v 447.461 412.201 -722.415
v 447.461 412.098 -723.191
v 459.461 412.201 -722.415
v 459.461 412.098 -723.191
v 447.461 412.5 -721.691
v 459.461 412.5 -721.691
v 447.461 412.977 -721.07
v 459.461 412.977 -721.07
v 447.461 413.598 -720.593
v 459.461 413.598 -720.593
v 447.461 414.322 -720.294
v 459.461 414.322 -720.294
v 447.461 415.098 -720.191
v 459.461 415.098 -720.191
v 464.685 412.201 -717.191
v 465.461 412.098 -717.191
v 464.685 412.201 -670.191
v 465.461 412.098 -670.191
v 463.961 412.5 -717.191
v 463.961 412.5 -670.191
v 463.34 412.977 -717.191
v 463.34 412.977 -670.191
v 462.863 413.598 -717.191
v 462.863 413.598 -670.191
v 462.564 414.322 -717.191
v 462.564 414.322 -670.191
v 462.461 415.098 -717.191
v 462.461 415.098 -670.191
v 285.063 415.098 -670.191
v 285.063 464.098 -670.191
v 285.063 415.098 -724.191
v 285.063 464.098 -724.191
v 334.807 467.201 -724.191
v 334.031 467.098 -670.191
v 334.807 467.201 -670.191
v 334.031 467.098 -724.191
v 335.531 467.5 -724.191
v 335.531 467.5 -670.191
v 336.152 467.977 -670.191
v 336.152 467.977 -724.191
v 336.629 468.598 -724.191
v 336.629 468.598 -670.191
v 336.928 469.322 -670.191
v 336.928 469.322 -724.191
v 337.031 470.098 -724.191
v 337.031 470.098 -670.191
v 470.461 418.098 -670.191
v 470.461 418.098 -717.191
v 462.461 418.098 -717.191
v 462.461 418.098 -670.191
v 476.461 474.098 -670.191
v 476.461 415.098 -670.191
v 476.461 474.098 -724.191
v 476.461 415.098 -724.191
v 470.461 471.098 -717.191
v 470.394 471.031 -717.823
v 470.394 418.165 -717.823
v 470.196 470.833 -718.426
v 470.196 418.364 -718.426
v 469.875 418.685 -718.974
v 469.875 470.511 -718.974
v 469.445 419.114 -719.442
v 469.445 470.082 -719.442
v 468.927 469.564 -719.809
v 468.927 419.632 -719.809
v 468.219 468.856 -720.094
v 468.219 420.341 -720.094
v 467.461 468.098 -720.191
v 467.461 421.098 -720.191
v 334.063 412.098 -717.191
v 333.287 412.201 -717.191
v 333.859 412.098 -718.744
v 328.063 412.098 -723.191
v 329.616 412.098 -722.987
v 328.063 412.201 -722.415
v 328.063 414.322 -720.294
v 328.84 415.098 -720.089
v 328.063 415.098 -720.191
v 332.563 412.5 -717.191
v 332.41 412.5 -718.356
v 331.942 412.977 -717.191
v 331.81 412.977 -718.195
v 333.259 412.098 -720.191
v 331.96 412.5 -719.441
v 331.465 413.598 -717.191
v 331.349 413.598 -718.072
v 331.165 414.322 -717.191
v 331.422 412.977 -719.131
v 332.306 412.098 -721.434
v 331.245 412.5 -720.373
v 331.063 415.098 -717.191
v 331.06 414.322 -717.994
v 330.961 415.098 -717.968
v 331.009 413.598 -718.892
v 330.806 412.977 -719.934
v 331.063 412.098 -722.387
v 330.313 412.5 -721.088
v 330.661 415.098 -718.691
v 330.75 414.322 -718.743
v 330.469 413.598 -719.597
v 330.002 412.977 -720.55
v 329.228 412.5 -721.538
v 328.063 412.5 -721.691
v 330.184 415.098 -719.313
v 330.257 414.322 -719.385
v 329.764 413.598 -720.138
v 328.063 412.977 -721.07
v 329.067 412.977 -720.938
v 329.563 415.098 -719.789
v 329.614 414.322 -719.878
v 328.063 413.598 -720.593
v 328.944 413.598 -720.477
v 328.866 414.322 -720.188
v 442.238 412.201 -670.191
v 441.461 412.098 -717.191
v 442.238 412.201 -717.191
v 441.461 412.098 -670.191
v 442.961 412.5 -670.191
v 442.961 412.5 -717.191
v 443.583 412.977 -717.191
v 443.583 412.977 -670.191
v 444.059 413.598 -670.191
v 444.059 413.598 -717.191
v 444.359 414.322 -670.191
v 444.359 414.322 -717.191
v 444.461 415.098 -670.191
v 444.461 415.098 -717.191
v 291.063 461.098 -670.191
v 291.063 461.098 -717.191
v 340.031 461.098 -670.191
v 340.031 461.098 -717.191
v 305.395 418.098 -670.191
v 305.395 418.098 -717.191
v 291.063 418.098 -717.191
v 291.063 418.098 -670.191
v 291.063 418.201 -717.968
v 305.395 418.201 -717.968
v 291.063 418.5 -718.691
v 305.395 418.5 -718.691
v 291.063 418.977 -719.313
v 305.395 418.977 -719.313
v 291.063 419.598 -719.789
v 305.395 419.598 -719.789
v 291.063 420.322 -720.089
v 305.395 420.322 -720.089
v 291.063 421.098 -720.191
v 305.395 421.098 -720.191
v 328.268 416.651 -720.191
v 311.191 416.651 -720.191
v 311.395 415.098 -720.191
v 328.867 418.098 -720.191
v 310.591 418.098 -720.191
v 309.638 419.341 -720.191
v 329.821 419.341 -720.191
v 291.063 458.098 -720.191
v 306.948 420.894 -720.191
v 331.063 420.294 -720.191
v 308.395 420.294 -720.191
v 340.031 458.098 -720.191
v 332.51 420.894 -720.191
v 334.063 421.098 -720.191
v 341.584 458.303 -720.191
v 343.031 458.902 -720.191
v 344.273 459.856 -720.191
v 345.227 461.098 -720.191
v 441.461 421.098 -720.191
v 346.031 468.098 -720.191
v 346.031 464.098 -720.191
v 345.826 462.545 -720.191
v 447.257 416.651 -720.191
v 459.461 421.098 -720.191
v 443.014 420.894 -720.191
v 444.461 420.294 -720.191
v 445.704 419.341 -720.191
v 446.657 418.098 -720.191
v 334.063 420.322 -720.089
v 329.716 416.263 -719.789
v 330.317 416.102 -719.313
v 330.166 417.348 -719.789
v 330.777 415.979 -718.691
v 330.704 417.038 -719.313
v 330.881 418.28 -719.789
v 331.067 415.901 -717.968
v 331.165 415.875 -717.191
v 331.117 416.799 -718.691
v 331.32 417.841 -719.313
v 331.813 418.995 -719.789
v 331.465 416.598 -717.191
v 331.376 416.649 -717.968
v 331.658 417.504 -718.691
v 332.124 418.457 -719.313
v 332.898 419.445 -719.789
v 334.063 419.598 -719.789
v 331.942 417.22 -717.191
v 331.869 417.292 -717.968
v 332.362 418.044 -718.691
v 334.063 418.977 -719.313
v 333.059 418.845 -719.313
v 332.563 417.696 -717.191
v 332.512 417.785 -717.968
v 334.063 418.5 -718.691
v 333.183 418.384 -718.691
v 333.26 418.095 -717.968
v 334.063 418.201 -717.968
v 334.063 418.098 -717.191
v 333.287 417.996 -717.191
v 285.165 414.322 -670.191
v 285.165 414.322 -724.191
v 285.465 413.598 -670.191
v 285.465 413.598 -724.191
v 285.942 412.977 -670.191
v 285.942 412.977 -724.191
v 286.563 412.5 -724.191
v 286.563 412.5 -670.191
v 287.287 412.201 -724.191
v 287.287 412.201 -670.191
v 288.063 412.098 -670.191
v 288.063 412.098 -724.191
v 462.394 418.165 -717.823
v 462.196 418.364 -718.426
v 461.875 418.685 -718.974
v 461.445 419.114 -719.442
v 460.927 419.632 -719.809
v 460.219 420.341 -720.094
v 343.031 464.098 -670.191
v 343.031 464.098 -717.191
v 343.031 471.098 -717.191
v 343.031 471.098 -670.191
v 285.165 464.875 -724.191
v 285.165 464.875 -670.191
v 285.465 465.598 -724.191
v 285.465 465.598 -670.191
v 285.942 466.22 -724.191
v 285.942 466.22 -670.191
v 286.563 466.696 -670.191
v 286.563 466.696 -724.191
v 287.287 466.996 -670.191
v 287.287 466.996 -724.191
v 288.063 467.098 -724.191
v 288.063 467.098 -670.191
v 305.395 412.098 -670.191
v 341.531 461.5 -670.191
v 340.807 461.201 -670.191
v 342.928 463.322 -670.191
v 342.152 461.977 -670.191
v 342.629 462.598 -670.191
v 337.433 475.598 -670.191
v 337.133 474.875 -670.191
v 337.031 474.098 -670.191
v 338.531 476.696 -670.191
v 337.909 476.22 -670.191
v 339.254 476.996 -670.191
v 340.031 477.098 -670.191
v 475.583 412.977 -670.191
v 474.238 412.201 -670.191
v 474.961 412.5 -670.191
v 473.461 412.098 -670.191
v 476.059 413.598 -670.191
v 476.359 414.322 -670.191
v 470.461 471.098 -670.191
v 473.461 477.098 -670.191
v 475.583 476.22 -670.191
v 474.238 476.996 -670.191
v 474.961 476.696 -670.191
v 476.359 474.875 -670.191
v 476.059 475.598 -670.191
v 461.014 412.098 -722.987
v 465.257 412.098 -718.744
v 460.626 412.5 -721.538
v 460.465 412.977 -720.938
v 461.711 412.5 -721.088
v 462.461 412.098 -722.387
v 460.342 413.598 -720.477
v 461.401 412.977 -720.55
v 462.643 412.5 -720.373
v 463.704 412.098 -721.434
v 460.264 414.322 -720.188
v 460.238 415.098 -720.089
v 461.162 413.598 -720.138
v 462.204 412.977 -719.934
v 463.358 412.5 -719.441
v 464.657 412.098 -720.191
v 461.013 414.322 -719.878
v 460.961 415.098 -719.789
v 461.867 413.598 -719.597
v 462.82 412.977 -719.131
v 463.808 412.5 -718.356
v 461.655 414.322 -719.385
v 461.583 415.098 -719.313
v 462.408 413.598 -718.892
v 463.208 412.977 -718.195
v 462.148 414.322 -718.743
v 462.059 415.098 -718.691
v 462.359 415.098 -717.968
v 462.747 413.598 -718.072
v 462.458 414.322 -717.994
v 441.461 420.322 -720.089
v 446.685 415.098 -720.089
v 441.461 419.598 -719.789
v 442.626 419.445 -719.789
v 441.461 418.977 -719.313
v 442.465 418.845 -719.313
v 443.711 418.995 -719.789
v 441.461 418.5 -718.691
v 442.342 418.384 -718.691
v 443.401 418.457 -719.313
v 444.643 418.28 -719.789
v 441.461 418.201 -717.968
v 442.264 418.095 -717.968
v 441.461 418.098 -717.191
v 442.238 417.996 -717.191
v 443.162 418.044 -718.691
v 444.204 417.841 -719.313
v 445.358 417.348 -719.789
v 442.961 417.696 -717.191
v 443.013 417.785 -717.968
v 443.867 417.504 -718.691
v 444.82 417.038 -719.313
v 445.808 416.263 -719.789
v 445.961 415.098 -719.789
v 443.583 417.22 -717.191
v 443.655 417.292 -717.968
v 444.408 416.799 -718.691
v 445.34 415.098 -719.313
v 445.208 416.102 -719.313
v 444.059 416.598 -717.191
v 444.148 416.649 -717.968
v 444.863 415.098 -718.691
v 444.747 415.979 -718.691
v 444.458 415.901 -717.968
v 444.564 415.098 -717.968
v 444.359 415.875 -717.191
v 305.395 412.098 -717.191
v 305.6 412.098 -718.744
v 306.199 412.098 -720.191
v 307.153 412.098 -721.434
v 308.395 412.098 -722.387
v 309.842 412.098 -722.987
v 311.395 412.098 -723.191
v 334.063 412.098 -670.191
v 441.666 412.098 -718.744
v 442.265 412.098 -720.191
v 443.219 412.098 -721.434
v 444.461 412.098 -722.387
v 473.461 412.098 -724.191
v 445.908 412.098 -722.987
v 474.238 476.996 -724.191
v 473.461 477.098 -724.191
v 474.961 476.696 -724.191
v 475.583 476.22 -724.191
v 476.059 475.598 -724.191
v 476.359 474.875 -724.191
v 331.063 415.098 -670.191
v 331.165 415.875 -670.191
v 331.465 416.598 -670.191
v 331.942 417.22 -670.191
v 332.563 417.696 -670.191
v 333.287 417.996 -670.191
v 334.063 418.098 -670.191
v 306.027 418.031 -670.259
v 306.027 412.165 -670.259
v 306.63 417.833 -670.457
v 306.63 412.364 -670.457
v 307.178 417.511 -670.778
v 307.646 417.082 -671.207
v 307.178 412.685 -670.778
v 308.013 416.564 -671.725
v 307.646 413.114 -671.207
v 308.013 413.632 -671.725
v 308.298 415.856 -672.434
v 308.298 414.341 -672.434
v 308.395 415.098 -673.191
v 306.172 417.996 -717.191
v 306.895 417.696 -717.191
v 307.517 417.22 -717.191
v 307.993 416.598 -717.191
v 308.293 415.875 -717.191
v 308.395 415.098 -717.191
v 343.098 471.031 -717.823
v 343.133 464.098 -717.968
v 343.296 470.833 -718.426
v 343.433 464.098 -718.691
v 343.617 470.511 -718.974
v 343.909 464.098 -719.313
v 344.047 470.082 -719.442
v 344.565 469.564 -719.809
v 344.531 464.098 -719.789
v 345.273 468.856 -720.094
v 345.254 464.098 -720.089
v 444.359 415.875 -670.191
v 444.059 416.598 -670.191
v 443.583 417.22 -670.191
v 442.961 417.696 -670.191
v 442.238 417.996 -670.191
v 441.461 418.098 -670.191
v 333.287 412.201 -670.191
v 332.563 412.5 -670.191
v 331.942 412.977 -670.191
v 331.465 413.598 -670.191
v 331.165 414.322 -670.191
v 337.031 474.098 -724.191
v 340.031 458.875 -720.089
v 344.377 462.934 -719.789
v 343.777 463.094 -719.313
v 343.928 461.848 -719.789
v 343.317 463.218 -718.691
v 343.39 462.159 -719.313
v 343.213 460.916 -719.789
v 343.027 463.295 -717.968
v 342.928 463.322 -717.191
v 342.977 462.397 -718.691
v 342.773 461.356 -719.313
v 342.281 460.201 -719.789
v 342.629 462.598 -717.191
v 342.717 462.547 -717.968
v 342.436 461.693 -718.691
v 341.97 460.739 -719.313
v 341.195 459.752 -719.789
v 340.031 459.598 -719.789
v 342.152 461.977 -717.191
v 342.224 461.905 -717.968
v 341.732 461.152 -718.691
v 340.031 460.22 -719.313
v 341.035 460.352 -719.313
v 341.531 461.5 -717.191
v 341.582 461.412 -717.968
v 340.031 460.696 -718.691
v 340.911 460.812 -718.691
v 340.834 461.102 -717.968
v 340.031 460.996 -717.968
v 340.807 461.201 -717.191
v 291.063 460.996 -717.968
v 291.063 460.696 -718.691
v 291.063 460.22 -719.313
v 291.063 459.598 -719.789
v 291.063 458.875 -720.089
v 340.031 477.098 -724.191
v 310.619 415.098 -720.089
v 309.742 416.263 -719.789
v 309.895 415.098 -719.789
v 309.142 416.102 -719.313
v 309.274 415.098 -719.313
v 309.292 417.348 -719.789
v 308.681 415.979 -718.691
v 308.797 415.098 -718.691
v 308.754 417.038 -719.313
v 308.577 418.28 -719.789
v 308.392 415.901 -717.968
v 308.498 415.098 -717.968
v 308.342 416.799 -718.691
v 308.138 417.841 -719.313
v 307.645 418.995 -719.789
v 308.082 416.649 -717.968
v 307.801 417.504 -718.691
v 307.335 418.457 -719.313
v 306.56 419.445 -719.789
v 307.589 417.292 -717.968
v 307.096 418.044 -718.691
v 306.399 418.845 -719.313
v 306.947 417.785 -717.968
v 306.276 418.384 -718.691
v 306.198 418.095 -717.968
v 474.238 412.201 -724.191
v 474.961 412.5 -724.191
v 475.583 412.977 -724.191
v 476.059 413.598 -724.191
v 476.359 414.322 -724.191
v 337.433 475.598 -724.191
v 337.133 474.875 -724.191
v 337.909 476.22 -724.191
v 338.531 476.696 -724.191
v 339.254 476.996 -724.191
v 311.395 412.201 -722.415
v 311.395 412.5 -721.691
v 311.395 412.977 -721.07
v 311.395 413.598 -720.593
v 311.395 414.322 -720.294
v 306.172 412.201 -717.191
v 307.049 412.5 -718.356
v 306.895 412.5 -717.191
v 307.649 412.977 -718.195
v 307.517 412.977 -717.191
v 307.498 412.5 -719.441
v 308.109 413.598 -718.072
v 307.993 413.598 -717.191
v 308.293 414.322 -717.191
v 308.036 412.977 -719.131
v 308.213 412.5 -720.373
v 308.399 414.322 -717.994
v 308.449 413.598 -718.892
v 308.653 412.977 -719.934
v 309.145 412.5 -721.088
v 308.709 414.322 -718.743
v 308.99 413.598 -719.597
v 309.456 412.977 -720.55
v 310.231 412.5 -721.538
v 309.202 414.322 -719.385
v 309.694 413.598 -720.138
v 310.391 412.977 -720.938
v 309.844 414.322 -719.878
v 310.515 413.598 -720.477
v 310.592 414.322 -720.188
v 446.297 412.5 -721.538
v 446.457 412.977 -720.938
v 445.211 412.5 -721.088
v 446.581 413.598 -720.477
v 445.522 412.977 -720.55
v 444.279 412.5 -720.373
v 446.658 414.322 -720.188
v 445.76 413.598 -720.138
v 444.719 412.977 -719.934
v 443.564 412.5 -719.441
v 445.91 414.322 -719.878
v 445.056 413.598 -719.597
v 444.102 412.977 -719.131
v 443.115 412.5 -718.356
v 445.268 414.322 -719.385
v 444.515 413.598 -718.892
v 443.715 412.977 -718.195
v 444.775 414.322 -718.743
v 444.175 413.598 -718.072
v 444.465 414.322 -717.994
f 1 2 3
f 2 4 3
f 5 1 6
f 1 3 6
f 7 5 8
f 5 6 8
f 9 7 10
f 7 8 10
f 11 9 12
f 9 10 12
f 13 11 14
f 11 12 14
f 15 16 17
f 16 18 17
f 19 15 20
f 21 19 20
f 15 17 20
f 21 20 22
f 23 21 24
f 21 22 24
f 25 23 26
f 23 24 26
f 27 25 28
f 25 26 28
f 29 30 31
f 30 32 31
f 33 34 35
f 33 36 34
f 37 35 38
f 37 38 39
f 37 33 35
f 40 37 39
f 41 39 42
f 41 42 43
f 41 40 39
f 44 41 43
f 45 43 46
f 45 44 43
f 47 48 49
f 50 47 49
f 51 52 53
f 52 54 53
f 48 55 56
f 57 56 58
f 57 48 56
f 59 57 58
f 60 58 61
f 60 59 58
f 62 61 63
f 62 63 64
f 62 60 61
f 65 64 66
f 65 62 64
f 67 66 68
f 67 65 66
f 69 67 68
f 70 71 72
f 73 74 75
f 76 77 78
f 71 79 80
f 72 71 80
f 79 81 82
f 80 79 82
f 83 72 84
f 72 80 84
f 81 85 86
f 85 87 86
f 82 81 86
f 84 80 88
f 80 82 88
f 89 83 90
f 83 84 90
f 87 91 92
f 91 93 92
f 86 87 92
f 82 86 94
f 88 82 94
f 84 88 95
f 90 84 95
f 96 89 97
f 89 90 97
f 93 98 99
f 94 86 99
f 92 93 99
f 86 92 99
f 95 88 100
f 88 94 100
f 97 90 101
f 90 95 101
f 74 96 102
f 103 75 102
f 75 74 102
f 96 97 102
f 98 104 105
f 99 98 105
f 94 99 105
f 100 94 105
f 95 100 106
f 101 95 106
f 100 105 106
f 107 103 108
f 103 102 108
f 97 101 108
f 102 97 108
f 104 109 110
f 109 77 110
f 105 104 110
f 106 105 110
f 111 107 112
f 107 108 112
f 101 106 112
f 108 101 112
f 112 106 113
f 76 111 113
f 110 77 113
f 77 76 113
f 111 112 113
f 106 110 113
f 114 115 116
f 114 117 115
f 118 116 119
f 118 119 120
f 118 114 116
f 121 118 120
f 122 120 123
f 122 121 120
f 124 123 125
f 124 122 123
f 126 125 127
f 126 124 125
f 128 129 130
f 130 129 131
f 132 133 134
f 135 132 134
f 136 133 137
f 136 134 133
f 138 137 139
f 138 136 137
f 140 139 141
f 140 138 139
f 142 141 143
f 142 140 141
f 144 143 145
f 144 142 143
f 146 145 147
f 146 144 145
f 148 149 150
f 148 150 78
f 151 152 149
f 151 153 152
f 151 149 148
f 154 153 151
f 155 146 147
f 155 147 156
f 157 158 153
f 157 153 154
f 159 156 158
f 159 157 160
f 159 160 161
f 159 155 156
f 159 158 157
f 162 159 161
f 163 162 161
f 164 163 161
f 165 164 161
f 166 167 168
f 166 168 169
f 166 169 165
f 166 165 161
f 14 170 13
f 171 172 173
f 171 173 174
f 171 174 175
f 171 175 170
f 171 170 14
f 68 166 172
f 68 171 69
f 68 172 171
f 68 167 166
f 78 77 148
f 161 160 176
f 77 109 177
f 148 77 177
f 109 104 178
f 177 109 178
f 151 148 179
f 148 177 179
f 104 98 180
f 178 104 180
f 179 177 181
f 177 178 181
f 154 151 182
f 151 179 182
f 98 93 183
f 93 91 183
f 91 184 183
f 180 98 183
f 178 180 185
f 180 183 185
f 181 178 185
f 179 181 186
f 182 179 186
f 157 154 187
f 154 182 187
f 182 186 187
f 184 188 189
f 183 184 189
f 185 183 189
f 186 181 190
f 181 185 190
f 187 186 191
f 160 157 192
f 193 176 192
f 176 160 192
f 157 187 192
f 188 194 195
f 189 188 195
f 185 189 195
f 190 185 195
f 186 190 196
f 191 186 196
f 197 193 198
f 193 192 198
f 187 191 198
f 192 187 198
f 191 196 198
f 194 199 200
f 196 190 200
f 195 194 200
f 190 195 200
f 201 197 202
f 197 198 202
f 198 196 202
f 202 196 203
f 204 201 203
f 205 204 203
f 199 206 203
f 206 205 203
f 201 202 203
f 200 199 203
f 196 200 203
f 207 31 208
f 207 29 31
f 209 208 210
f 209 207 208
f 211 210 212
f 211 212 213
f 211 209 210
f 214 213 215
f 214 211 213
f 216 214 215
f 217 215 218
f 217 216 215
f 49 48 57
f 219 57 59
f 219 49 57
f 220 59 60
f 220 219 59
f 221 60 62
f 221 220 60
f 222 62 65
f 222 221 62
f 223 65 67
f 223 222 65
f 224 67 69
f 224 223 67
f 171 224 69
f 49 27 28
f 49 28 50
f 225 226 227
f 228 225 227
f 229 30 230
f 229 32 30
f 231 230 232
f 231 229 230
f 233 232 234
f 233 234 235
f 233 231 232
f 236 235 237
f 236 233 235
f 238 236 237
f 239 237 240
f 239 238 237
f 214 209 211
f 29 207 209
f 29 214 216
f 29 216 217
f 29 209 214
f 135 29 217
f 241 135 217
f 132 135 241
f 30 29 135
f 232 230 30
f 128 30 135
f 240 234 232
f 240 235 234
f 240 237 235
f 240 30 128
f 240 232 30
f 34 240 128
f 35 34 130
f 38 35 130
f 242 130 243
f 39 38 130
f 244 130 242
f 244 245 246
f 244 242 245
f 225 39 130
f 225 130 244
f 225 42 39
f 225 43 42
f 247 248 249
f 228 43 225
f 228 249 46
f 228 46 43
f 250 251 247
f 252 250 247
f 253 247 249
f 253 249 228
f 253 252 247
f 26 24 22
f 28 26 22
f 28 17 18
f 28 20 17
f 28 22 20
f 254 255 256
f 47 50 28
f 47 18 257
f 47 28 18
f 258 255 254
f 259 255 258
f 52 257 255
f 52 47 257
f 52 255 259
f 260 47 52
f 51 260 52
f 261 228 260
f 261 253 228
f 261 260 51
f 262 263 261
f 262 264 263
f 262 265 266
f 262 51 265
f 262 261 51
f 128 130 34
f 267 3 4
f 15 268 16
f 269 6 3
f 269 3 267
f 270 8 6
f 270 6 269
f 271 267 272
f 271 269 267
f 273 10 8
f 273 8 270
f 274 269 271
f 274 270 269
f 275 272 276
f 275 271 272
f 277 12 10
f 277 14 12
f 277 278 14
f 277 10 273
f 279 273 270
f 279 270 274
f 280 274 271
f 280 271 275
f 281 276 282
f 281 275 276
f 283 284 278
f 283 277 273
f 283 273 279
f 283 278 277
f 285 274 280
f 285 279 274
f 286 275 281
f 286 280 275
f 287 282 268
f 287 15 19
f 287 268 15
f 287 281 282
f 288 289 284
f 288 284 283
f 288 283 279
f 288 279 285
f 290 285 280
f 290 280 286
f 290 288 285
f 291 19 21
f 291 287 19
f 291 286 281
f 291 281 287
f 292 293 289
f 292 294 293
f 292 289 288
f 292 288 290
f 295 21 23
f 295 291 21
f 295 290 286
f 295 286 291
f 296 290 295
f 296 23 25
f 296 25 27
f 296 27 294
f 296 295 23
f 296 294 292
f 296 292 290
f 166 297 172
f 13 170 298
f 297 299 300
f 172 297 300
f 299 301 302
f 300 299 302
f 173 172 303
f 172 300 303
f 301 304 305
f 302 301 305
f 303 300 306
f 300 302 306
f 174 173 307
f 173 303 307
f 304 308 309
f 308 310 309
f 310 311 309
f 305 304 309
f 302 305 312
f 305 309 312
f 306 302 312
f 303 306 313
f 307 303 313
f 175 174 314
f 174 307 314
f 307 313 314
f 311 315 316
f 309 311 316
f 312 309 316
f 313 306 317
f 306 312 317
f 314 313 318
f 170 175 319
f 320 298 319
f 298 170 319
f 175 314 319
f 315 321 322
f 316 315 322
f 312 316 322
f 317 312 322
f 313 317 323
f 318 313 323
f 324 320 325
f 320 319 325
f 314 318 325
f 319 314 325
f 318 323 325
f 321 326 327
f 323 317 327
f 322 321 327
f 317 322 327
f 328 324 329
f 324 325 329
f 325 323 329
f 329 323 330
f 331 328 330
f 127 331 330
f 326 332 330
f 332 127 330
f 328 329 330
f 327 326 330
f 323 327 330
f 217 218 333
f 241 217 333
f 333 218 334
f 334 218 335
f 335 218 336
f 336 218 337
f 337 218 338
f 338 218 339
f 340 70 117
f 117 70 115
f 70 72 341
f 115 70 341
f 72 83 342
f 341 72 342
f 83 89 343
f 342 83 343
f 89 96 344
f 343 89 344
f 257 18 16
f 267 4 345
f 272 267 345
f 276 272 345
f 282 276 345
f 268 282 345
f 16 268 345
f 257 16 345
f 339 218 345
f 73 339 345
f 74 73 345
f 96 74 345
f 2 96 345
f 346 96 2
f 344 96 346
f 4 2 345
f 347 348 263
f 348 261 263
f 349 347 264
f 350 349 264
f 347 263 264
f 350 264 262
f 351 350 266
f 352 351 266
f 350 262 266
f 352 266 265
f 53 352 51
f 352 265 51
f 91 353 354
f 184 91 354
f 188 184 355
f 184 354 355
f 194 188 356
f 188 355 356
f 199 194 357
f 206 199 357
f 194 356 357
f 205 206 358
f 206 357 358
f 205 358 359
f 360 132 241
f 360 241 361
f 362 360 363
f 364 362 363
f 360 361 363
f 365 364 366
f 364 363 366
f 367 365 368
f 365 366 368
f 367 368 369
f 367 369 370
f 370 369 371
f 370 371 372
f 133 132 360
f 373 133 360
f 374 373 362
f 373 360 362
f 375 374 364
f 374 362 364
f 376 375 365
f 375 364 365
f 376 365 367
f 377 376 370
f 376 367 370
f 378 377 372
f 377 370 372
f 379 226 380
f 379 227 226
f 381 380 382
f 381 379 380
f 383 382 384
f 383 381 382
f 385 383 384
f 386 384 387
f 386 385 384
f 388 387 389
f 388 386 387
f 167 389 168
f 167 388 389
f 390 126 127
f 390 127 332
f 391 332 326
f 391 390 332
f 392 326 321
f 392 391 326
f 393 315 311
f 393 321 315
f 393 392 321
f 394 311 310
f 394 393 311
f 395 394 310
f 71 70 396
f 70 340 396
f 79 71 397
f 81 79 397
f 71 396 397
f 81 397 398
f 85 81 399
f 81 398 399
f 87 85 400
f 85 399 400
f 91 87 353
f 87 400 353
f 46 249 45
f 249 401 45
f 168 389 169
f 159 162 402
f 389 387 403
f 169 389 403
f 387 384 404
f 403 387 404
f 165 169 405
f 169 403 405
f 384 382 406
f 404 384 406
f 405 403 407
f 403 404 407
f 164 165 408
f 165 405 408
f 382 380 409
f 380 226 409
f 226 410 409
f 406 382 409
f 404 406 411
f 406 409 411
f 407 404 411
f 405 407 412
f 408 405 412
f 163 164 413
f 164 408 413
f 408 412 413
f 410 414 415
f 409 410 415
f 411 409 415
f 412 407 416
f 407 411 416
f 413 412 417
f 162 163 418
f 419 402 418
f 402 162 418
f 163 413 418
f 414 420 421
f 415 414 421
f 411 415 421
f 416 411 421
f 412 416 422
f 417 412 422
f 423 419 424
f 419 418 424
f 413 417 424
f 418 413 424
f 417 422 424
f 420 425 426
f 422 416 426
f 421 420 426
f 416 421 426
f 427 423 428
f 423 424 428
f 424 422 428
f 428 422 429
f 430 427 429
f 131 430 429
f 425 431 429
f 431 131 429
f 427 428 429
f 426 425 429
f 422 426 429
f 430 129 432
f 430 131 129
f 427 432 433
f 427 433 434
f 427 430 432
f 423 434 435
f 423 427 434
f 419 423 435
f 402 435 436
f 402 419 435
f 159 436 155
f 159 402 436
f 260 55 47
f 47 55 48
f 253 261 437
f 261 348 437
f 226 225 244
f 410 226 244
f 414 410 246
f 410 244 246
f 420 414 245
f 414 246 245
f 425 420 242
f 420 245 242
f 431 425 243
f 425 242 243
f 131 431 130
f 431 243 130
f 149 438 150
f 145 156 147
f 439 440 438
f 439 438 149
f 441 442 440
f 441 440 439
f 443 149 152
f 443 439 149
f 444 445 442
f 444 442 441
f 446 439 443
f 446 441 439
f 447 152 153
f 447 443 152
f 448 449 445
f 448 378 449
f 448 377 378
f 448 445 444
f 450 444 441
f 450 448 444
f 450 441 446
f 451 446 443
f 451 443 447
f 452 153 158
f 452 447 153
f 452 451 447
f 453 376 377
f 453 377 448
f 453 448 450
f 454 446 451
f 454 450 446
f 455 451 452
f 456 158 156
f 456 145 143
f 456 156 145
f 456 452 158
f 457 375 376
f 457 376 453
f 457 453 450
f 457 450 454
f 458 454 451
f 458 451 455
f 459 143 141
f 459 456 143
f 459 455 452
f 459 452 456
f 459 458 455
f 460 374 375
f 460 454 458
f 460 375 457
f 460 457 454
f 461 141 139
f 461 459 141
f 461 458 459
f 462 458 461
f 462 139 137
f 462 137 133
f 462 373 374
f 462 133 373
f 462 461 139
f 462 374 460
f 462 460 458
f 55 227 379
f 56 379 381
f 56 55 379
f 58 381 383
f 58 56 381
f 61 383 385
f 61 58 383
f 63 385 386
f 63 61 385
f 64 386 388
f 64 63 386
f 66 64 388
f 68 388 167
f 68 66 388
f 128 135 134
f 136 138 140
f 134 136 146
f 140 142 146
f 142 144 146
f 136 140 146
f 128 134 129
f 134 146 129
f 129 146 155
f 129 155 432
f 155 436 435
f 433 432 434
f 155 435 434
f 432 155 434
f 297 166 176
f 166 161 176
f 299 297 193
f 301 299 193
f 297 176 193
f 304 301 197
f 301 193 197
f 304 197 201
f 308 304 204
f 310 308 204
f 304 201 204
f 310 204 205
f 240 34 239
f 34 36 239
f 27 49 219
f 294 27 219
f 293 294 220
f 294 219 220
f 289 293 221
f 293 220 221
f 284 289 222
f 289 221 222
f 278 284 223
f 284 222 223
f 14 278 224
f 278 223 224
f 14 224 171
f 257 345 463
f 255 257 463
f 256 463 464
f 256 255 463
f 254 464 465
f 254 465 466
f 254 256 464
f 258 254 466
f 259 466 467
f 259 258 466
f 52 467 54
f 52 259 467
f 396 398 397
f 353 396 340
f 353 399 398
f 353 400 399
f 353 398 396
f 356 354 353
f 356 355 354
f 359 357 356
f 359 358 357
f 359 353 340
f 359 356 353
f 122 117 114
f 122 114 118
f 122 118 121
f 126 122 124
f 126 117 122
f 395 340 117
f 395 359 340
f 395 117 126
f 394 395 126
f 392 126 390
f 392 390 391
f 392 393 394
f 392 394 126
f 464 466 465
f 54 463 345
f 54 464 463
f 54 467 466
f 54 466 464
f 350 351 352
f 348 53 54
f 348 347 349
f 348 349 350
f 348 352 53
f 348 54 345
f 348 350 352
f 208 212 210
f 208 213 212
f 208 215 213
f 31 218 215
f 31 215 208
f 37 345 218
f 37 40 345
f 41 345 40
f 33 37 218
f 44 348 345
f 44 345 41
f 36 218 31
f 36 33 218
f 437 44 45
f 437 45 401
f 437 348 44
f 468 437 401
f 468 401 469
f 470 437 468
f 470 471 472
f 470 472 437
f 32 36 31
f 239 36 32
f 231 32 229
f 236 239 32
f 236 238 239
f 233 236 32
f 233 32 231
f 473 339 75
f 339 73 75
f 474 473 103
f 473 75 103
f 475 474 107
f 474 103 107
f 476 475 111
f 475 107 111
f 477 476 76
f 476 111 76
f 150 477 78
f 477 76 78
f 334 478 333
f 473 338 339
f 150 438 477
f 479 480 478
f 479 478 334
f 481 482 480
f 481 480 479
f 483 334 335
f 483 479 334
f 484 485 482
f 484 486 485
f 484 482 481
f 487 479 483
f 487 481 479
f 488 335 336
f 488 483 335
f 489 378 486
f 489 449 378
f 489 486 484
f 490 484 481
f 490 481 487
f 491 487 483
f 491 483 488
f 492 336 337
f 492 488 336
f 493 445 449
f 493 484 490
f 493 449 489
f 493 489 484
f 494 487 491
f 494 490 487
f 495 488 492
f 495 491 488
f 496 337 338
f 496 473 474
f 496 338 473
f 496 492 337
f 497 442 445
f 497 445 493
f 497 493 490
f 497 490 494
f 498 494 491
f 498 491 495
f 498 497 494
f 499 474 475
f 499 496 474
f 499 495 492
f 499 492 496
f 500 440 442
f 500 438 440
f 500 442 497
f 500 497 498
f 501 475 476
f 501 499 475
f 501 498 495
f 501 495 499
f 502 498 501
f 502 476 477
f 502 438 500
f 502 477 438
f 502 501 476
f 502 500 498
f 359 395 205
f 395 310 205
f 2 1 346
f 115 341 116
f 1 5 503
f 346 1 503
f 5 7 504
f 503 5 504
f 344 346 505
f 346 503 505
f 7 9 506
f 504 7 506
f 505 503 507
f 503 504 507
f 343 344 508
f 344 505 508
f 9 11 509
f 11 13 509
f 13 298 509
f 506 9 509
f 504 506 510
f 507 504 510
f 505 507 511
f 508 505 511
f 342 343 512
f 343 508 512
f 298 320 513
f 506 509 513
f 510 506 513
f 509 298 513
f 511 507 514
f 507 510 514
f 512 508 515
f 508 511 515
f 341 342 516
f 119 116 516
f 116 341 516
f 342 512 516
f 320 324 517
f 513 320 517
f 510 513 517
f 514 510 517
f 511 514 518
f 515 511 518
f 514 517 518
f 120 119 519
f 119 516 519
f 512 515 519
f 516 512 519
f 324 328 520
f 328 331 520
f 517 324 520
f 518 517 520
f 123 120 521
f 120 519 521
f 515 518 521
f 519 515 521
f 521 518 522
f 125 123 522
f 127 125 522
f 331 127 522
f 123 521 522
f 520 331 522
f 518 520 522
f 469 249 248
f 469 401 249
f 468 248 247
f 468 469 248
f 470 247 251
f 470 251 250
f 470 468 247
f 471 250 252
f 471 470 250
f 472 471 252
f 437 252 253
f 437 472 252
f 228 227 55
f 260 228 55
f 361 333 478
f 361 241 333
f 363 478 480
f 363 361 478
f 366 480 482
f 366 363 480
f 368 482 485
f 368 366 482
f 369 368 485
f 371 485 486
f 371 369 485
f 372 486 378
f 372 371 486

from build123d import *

# Parameters (mm, degrees)
BOSS_EXTRUDE1_DEPTH     = 4
BOSS_EXTRUDE2_DEPTH     = 50
CUT_EXTRUDE1_DEPTH      = 677.427541211
CUT_EXTRUDE1_DEPTH_BACK = 50
SKETCH3_W               = 22.667747696
SKETCH3_H               = 6
SKETCH3_W_2             = 18
FILLET3_R               = 3


with BuildPart() as part:
    # Sketch1 → Boss-Extrude1 (new body)
    with BuildSketch(Plane.XY.offset(-724.191392871)):
        Polygon((476.461364297, 467.098298929), (476.461364297, 412.098298929), (285.063110998, 412.098298929), (285.063110998, 467.098298929), (337.030633325, 467.098298929), (337.030633325, 477.098298929), (476.461364297, 477.098298929), align=None)
    extrude(amount=BOSS_EXTRUDE1_DEPTH)

    # Sketch2 → Boss-Extrude2 (add)
    with BuildSketch(Plane.XY.offset(-720.191392871)):
        Polygon((285.063110998, 467.098298929), (285.063110998, 412.098298929), (476.461364297, 412.098298929), (476.461364297, 477.098298929), (337.030633325, 477.098298929), (337.030633325, 467.098298929), align=None)
        Polygon((291.063110998, 461.098298929), (343.030633325, 461.098298929), (343.030633325, 471.098298929), (470.461364297, 471.098298929), (470.461364297, 418.098298929), (291.063110998, 418.098298929), align=None, mode=Mode.SUBTRACT)
    extrude(amount=BOSS_EXTRUDE2_DEPTH)

    # Sketch3 → Cut-Extrude1 (cut, two sides: drawn at the far end of the back side and taken through both)
    with BuildSketch(Plane.XY.offset(-670.191392871).offset(-CUT_EXTRUDE1_DEPTH_BACK)):
        with Locations((319.72923715, 415.098298929)):
            Rectangle(SKETCH3_W, SKETCH3_H)
        with Locations((453.461364297, 415.098298929)):
            Rectangle(SKETCH3_W_2, SKETCH3_H)
    extrude(amount=CUT_EXTRUDE1_DEPTH + CUT_EXTRUDE1_DEPTH_BACK, mode=Mode.SUBTRACT)

    # Fillet3
    fillet3_edges = [part.edges().sort_by_distance(p)[0] for p in [
        (337.030633325, 477.098298929, -697.191392871),
        (476.461364297, 477.098298929, -697.191392871),
        (476.461364297, 412.098298929, -697.191392871),
        (285.063110998, 412.098298929, -697.191392871),
        (285.063110998, 467.098298929, -697.191392871),
        (337.030633325, 467.098298929, -697.191392871),
        (343.030633325, 461.098298929, -695.191392871),
        (406.745998811, 471.098298929, -720.191392871),
        (343.030633325, 466.098298929, -720.191392871),
        (317.046872162, 461.098298929, -720.191392871),
        (299.72923715, 418.098298929, -720.191392871),
        (470.461364297, 444.598298929, -720.191392871),
        (387.762237648, 418.098298929, -720.191392871),
        (466.461364297, 418.098298929, -720.191392871),
        (308.395363302, 415.098298929, -670.191392871),
        (331.063110998, 418.098298929, -695.191392871),
        (331.063110998, 415.098298929, -720.191392871),
        (331.063110998, 412.098298929, -695.191392871),
        (308.395363302, 412.098298929, -695.191392871),
        (308.395363302, 418.098298929, -695.191392871),
        (319.72923715, 412.098298929, -720.191392871),
        (308.395363302, 415.098298929, -720.191392871),
        (444.461364297, 412.098298929, -695.191392871),
        (444.461364297, 415.098298929, -720.191392871),
        (444.461364297, 418.098298929, -695.191392871),
        (462.461364297, 412.098298929, -695.191392871),
        (462.461364297, 415.098298929, -720.191392871),
        (453.461364297, 412.098298929, -720.191392871),
    ]]
    fillet(fillet3_edges, radius=FILLET3_R - 0.0001)  # a hair under: the kernel refuses the full size


solid = part.part
